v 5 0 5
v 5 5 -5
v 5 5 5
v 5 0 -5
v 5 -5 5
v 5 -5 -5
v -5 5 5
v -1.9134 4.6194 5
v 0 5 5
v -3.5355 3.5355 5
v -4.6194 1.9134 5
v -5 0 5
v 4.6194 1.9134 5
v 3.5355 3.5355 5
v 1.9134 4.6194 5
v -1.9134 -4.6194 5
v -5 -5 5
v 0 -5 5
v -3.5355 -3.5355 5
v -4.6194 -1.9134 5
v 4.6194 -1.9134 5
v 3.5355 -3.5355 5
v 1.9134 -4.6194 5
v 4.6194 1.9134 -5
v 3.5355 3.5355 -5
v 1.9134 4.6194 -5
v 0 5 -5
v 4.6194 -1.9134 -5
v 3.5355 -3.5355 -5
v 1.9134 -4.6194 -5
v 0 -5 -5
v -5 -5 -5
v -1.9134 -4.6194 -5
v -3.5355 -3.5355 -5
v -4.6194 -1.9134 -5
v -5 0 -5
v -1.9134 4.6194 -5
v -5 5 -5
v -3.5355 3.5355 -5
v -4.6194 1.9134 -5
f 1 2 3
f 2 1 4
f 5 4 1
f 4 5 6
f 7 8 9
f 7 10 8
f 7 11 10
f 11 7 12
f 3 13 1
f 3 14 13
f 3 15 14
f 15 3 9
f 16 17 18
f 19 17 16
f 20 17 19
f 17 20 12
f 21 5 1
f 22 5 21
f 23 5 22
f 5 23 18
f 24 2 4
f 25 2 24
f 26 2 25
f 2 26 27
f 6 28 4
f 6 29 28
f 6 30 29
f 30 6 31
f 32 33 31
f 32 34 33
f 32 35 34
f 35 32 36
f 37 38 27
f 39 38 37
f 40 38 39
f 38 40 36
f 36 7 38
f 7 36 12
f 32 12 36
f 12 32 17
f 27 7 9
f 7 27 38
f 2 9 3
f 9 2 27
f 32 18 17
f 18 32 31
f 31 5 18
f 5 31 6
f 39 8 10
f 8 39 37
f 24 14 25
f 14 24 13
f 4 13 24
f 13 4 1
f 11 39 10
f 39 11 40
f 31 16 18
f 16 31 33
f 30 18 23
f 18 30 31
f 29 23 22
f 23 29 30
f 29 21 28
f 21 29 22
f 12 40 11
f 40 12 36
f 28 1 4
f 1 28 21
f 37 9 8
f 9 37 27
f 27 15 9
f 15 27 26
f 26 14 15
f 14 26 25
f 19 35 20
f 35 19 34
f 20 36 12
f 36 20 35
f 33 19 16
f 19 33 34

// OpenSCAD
// Size of the cube (all directions)
cubSiz = 10;

//Diameter of the Cylinder
cyDia = 10;

//Height of the Cylinder
cyHei = 15;

// Let's subtract the Cylinder from the Cube
difference(){
    cube(size = [cubSiz, cubSiz, cubSiz], center = true);
    cylinder(d = cyDia, h = cyHei, center = true);
}
